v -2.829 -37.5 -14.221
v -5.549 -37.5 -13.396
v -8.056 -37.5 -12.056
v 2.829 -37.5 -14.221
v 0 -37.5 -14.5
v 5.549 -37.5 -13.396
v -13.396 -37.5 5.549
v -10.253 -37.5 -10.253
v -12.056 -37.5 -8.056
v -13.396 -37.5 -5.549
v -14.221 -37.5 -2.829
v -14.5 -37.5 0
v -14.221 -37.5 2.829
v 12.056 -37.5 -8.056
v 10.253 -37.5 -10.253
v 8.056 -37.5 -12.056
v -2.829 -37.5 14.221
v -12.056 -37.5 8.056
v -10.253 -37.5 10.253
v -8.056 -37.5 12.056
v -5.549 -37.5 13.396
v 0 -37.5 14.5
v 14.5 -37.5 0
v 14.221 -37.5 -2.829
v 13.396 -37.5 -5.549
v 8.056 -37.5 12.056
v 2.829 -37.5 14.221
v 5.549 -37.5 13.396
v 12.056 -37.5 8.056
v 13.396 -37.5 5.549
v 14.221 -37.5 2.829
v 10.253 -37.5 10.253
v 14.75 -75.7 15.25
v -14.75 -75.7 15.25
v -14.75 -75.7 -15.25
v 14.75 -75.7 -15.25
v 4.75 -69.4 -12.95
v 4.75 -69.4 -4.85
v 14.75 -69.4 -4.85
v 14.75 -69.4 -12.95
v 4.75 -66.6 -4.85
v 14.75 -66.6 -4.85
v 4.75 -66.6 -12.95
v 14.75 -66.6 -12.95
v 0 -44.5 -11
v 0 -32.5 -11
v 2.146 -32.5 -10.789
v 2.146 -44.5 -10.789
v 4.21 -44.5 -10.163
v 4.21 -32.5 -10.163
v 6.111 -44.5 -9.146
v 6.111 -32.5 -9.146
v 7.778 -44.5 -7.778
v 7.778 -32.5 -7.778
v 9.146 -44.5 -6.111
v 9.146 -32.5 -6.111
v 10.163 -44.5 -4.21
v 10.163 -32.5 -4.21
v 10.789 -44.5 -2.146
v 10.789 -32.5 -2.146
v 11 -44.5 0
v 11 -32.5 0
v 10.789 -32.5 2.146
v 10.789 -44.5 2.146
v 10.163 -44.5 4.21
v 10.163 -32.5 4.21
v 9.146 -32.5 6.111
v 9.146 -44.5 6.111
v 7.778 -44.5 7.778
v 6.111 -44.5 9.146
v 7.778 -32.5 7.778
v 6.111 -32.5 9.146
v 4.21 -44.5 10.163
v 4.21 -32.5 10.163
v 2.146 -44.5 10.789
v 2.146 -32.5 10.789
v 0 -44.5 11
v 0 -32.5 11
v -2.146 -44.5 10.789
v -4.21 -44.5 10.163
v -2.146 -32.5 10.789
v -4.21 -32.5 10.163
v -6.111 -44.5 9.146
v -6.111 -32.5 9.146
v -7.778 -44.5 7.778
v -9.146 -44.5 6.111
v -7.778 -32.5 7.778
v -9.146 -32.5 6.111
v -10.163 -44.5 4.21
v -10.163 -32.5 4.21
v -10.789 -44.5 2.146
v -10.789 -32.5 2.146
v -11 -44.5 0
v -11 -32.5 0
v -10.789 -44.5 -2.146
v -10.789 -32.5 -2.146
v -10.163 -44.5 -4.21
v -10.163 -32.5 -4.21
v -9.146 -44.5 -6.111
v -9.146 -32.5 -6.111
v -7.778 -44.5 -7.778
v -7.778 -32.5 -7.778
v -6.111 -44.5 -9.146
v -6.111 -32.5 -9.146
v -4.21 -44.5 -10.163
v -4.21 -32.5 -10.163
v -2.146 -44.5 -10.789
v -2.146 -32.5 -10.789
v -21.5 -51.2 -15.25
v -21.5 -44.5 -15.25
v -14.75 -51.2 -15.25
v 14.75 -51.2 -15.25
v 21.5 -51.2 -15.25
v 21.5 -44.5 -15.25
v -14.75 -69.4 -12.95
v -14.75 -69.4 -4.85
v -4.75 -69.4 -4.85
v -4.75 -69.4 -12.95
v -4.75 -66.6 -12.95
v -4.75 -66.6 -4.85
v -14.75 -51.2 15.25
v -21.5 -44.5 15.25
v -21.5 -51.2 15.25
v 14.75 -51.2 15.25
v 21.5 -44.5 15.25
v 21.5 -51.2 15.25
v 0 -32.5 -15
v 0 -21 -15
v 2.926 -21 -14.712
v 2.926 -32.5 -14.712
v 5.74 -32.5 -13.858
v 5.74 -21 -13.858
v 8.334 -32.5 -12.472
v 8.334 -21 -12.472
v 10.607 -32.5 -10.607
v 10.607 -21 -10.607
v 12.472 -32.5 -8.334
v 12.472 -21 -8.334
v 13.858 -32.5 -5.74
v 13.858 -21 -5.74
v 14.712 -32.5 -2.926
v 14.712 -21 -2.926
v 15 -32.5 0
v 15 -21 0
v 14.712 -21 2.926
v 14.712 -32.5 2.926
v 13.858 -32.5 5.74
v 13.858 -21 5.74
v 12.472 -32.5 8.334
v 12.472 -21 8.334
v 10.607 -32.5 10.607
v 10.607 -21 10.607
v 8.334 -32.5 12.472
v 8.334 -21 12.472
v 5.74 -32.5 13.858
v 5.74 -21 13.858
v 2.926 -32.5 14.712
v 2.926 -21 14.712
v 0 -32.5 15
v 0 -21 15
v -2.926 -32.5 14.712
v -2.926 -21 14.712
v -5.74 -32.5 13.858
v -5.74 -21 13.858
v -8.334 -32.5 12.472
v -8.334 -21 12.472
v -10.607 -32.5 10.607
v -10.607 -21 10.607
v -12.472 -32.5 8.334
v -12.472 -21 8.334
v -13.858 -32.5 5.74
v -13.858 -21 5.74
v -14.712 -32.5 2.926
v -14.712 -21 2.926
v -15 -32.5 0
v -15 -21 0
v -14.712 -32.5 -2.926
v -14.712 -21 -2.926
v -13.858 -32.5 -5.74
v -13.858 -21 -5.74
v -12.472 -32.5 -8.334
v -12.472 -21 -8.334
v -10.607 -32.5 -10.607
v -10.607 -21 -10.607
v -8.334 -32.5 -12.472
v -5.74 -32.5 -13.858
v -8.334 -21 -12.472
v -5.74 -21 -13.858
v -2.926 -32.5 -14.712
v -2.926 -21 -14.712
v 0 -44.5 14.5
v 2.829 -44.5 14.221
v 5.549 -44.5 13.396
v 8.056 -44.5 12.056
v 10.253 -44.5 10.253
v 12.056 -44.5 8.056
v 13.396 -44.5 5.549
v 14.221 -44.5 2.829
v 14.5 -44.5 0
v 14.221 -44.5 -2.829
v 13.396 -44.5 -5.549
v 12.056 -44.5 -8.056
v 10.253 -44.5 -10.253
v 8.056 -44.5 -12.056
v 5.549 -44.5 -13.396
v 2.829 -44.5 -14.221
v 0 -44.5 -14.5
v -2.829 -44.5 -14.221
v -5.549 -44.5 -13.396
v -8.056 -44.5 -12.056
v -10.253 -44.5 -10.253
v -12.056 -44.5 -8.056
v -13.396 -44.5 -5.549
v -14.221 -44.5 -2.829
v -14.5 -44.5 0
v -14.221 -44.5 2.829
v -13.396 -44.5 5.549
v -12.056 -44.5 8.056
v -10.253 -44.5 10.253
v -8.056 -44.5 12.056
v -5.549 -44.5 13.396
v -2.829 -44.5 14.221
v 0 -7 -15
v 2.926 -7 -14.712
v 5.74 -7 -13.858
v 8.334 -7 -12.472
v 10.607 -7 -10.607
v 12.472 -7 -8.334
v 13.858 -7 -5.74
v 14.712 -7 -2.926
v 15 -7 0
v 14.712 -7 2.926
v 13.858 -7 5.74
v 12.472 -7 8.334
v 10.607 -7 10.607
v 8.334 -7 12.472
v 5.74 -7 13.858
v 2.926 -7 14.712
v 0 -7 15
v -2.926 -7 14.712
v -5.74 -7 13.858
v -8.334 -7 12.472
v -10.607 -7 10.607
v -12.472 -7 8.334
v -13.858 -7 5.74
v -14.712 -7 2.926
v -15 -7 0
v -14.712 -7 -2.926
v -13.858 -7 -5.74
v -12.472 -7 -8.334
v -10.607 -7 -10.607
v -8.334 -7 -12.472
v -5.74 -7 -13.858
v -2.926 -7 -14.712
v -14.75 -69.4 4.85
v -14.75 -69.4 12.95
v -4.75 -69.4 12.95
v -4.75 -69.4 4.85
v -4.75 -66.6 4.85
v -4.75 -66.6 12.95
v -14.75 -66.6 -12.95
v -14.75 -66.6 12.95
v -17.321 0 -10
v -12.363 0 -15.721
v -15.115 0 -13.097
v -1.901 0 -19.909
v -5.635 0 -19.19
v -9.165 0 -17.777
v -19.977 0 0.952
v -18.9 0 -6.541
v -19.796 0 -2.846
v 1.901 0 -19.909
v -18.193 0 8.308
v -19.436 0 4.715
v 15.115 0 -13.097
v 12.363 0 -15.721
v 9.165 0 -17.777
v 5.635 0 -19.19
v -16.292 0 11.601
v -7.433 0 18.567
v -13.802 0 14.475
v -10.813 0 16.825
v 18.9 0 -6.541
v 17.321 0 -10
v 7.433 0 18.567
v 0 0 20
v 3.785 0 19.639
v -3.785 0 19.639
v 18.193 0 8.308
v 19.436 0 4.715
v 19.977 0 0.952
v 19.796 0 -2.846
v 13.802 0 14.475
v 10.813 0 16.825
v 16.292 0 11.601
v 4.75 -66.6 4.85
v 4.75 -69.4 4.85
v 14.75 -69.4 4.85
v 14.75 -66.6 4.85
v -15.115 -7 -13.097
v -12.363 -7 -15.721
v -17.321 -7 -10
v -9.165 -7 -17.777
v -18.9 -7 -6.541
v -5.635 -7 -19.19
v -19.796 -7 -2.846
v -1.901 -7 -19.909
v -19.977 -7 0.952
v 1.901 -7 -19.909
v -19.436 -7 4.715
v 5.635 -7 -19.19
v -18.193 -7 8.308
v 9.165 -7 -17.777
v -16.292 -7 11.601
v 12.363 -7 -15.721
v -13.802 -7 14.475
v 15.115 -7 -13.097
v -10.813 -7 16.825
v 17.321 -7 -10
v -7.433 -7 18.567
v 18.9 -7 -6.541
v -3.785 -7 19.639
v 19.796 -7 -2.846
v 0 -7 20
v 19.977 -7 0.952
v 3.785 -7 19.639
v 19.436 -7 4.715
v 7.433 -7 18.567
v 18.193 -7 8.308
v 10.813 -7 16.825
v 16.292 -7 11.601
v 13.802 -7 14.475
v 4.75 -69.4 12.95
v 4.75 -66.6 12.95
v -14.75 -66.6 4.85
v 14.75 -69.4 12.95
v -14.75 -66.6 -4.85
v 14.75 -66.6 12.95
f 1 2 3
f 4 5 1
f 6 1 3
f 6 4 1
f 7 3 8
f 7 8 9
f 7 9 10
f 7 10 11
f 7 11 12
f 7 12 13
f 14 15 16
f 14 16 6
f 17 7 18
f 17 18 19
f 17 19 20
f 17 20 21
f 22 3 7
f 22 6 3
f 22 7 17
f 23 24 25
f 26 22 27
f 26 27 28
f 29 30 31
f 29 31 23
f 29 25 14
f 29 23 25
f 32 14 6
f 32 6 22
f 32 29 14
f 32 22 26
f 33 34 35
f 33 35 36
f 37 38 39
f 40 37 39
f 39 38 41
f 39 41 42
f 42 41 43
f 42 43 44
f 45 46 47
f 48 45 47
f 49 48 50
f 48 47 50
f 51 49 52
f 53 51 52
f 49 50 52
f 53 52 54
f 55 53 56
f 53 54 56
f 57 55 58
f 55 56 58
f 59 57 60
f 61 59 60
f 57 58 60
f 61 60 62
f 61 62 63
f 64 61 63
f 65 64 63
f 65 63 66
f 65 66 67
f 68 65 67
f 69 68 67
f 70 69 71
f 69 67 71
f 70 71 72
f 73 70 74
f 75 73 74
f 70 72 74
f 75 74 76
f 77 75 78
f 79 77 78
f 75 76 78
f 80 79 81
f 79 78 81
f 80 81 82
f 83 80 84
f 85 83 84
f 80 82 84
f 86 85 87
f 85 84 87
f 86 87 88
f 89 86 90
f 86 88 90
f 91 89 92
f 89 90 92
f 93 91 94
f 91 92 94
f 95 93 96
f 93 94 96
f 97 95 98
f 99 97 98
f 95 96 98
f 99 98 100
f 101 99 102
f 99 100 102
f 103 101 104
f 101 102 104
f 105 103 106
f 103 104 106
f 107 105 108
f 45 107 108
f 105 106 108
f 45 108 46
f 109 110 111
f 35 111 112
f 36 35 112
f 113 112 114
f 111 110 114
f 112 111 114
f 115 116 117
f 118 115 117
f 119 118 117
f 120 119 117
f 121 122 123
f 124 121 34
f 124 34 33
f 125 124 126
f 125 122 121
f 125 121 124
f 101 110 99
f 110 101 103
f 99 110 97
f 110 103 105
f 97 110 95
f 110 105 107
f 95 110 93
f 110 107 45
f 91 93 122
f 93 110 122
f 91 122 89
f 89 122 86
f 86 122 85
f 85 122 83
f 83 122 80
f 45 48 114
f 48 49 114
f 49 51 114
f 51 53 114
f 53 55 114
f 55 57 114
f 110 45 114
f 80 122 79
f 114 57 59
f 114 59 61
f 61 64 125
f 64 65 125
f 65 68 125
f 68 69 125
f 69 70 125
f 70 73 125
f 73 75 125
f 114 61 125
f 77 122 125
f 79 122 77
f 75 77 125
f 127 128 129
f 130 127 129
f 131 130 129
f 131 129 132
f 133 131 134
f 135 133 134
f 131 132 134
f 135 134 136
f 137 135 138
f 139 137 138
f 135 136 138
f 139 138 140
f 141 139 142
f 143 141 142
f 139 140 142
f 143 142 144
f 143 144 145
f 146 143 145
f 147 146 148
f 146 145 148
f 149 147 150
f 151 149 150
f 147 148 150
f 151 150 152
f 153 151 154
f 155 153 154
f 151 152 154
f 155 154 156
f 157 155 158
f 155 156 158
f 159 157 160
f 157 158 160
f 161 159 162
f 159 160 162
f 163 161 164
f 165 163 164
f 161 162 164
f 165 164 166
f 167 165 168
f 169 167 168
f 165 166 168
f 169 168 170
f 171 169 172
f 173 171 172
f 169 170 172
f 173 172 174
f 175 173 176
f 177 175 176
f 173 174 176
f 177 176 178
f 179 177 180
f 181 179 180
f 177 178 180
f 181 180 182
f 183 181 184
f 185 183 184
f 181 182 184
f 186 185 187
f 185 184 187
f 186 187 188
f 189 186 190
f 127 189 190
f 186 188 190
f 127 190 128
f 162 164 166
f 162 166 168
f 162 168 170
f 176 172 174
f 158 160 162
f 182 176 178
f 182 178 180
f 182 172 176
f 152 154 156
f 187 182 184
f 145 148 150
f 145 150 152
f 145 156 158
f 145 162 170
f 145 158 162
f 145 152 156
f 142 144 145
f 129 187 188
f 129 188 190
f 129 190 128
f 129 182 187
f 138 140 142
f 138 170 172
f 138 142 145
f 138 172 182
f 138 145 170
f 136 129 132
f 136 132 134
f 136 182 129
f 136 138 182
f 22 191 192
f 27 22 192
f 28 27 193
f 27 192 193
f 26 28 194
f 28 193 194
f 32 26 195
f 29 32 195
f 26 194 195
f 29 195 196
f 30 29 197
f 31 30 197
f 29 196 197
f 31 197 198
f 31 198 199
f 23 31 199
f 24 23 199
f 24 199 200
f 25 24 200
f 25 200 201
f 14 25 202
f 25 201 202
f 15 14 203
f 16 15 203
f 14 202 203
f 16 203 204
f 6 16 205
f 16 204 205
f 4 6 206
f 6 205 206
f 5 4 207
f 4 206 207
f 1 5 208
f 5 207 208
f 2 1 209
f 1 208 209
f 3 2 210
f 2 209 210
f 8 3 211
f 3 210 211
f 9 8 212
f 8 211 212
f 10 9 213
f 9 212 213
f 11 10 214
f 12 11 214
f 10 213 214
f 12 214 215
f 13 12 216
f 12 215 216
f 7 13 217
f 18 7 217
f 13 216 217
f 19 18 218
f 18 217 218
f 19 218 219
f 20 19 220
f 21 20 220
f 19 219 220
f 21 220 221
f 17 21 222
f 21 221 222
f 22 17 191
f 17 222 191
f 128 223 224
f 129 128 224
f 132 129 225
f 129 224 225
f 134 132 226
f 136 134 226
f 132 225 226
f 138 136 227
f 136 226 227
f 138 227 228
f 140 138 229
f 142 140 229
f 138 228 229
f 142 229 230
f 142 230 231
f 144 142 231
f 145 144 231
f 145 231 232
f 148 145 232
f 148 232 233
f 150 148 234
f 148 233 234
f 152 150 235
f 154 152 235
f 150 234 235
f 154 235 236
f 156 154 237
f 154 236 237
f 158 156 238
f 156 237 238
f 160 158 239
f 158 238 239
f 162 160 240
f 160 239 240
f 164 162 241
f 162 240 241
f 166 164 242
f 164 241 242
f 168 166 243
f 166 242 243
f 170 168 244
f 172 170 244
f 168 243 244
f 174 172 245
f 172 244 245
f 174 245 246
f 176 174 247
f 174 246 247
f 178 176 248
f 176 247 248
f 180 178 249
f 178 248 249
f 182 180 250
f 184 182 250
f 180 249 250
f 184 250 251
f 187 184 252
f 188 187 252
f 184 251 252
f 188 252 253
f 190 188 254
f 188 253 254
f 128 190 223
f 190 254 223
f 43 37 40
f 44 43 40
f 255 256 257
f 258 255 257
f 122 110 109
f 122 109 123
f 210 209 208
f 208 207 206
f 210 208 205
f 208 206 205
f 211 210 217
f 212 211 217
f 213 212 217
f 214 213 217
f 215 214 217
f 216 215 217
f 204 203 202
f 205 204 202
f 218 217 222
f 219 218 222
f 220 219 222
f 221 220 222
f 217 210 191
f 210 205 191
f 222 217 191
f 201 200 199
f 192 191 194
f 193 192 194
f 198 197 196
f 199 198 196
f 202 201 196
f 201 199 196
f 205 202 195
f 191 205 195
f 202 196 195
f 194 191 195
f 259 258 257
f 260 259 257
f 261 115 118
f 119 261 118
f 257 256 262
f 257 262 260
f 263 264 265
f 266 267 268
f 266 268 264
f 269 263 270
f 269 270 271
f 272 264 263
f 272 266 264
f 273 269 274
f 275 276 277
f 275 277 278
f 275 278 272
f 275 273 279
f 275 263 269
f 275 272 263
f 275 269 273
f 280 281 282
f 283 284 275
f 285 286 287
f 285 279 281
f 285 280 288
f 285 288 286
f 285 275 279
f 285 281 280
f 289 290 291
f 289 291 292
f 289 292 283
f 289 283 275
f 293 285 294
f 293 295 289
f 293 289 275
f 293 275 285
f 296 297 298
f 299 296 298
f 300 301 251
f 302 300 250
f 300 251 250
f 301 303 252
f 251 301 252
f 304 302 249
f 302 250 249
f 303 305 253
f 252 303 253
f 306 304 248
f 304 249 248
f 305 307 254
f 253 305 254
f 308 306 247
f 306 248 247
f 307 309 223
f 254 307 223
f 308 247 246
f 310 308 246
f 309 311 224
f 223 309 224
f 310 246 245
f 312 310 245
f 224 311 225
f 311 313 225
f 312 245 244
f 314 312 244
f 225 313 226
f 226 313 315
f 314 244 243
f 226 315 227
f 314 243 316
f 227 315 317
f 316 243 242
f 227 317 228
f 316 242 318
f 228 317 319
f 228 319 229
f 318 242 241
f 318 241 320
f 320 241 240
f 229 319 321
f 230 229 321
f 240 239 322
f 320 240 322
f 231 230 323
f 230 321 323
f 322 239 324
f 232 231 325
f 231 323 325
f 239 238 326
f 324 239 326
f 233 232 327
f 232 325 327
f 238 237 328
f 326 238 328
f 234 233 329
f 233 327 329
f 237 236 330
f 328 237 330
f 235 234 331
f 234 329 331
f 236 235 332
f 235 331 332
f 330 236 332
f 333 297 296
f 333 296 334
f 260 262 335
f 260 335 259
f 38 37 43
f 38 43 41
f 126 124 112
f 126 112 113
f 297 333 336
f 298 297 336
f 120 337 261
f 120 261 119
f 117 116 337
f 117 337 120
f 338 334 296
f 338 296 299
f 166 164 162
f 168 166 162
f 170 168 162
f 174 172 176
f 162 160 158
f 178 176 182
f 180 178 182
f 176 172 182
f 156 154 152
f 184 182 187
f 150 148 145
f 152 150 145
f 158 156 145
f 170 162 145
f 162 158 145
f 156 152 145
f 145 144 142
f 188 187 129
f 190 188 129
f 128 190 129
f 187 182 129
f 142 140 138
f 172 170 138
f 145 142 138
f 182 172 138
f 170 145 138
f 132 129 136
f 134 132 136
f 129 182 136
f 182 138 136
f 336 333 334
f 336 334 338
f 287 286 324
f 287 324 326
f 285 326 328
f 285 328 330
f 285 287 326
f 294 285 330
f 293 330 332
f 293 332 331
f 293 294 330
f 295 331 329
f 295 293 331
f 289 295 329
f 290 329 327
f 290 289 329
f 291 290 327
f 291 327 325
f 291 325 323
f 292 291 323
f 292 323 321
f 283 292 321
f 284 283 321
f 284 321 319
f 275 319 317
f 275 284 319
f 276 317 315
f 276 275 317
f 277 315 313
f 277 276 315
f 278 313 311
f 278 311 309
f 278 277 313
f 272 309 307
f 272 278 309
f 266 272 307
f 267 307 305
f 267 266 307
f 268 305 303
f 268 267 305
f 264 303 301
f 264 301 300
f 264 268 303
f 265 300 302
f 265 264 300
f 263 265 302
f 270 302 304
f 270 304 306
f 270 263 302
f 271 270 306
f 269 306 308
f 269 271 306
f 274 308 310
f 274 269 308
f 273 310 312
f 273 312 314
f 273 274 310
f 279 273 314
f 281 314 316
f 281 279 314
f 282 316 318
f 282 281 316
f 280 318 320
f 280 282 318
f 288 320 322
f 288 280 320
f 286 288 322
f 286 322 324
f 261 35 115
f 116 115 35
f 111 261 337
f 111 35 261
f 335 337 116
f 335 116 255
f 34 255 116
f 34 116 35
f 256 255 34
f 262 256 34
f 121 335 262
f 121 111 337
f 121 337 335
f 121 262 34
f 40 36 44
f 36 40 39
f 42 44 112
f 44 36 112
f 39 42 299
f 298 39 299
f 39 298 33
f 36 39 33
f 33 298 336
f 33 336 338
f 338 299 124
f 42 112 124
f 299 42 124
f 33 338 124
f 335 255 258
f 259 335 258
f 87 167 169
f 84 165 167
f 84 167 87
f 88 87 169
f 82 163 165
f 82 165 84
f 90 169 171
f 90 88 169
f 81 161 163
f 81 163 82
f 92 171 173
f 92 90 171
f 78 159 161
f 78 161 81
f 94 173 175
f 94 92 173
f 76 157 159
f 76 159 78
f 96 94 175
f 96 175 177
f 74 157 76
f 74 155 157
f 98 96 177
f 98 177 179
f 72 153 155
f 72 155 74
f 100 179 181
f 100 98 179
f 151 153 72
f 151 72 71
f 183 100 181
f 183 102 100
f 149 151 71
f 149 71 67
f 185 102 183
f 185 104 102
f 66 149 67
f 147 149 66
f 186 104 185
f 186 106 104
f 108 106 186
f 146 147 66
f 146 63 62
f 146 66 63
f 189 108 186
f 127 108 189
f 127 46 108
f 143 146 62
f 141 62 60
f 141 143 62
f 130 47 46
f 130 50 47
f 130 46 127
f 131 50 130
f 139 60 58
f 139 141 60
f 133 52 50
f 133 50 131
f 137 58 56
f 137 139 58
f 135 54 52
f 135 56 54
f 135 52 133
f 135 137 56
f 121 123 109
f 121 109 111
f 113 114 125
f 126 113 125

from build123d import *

# Parameters (mm, degrees)
ESQUISSE1_R             = 20
BOSS_EXTRU_1_DEPTH      = 7
ESQUISSE2_R             = 15
BOSS_EXTRU_2_DEPTH      = 14
ESQUISSE3_R             = 15
BOSS_EXTRU_3_DEPTH      = 11.5
ESQUISSE4_R             = 11
BOSS_EXTRU_4_DEPTH      = 12
ESQUISSE5_W             = 43
ESQUISSE5_H             = 30.5
BOSS_EXTRU_5_DEPTH      = 6.7
ESQUISSE6_W             = 29.5
ESQUISSE6_H             = 30.5
BOSS_EXTRU_6_DEPTH      = 24.5
ENL_V_START             = -6.3
ESQUISSE7_W             = 10
ESQUISSE7_H             = 8.1
ENL_V_MAT_EXTRU_1_DEPTH = 2.8
ESQUISSE8_R             = 14.5
BAGUE_SERRAGE_DEPTH     = 7


with BuildPart() as part:
    # Esquisse1 → Boss.-Extru.1 (new body)
    with BuildSketch(Plane(origin=(0, 0, 0), x_dir=(1, 0, 0), z_dir=(0, 1, 0))):
        with Locations(Location((0, 0, 0), (0, 0, 270))):
            Circle(ESQUISSE1_R)
    extrude(amount=-BOSS_EXTRU_1_DEPTH)

    # Esquisse2 → Boss.-Extru.2 (add)
    with BuildSketch(Plane.XZ.offset(7)):
        with Locations(Location((0, 0, 0), (0, 0, 270))):
            Circle(ESQUISSE2_R)
    extrude(amount=BOSS_EXTRU_2_DEPTH)


with BuildPart() as body_2:
    # Esquisse3 → Boss.-Extru.3 (new body)
    with BuildSketch(Plane.XZ.offset(21)):
        with Locations(Location((0, 0, 0), (0, 0, 270))):
            Circle(ESQUISSE3_R)
    extrude(amount=BOSS_EXTRU_3_DEPTH)

    # Esquisse4 → Boss.-Extru.4 (add)
    with BuildSketch(Plane.XZ.offset(32.5)):
        with Locations(Location((0, 0, 0), (0, 0, 270))):
            Circle(ESQUISSE4_R)
    extrude(amount=BOSS_EXTRU_4_DEPTH)

    # Esquisse5 → Boss.-Extru.5 (add)
    with BuildSketch(Plane.XZ.offset(44.5)):
        Rectangle(ESQUISSE5_W, ESQUISSE5_H)
    extrude(amount=BOSS_EXTRU_5_DEPTH)

    # Esquisse6 → Boss.-Extru.6 (add)
    with BuildSketch(Plane.XZ.offset(51.2)):
        Rectangle(ESQUISSE6_W, ESQUISSE6_H)
    extrude(amount=BOSS_EXTRU_6_DEPTH)

    # Esquisse7 → Enlèv. mat.-Extru.1 (cut)
    with BuildSketch(Plane.XZ.offset(75.7).offset(ENL_V_START)):
        with Locations((-9.75, 8.9)):
            Rectangle(ESQUISSE7_W, ESQUISSE7_H)
        with Locations((9.75, 8.9)):
            Rectangle(ESQUISSE7_W, ESQUISSE7_H)
        with Locations((9.75, -8.9)):
            Rectangle(ESQUISSE7_W, ESQUISSE7_H)
        with Locations((-9.75, -8.9)):
            Rectangle(ESQUISSE7_W, ESQUISSE7_H)
    extrude(amount=-ENL_V_MAT_EXTRU_1_DEPTH, mode=Mode.SUBTRACT)


with BuildPart() as body_3:
    # Esquisse8 → bague serrage (new body)
    with BuildSketch(Plane(origin=(0, -44.5, 0), x_dir=(1, 0, 0), z_dir=(0, 1, 0))):
        with Locations(Location((0, 0, 0), (0, 0, 270))):
            Circle(ESQUISSE8_R)
    extrude(amount=BAGUE_SERRAGE_DEPTH)


solid = Compound([part.part, body_2.part, body_3.part])
